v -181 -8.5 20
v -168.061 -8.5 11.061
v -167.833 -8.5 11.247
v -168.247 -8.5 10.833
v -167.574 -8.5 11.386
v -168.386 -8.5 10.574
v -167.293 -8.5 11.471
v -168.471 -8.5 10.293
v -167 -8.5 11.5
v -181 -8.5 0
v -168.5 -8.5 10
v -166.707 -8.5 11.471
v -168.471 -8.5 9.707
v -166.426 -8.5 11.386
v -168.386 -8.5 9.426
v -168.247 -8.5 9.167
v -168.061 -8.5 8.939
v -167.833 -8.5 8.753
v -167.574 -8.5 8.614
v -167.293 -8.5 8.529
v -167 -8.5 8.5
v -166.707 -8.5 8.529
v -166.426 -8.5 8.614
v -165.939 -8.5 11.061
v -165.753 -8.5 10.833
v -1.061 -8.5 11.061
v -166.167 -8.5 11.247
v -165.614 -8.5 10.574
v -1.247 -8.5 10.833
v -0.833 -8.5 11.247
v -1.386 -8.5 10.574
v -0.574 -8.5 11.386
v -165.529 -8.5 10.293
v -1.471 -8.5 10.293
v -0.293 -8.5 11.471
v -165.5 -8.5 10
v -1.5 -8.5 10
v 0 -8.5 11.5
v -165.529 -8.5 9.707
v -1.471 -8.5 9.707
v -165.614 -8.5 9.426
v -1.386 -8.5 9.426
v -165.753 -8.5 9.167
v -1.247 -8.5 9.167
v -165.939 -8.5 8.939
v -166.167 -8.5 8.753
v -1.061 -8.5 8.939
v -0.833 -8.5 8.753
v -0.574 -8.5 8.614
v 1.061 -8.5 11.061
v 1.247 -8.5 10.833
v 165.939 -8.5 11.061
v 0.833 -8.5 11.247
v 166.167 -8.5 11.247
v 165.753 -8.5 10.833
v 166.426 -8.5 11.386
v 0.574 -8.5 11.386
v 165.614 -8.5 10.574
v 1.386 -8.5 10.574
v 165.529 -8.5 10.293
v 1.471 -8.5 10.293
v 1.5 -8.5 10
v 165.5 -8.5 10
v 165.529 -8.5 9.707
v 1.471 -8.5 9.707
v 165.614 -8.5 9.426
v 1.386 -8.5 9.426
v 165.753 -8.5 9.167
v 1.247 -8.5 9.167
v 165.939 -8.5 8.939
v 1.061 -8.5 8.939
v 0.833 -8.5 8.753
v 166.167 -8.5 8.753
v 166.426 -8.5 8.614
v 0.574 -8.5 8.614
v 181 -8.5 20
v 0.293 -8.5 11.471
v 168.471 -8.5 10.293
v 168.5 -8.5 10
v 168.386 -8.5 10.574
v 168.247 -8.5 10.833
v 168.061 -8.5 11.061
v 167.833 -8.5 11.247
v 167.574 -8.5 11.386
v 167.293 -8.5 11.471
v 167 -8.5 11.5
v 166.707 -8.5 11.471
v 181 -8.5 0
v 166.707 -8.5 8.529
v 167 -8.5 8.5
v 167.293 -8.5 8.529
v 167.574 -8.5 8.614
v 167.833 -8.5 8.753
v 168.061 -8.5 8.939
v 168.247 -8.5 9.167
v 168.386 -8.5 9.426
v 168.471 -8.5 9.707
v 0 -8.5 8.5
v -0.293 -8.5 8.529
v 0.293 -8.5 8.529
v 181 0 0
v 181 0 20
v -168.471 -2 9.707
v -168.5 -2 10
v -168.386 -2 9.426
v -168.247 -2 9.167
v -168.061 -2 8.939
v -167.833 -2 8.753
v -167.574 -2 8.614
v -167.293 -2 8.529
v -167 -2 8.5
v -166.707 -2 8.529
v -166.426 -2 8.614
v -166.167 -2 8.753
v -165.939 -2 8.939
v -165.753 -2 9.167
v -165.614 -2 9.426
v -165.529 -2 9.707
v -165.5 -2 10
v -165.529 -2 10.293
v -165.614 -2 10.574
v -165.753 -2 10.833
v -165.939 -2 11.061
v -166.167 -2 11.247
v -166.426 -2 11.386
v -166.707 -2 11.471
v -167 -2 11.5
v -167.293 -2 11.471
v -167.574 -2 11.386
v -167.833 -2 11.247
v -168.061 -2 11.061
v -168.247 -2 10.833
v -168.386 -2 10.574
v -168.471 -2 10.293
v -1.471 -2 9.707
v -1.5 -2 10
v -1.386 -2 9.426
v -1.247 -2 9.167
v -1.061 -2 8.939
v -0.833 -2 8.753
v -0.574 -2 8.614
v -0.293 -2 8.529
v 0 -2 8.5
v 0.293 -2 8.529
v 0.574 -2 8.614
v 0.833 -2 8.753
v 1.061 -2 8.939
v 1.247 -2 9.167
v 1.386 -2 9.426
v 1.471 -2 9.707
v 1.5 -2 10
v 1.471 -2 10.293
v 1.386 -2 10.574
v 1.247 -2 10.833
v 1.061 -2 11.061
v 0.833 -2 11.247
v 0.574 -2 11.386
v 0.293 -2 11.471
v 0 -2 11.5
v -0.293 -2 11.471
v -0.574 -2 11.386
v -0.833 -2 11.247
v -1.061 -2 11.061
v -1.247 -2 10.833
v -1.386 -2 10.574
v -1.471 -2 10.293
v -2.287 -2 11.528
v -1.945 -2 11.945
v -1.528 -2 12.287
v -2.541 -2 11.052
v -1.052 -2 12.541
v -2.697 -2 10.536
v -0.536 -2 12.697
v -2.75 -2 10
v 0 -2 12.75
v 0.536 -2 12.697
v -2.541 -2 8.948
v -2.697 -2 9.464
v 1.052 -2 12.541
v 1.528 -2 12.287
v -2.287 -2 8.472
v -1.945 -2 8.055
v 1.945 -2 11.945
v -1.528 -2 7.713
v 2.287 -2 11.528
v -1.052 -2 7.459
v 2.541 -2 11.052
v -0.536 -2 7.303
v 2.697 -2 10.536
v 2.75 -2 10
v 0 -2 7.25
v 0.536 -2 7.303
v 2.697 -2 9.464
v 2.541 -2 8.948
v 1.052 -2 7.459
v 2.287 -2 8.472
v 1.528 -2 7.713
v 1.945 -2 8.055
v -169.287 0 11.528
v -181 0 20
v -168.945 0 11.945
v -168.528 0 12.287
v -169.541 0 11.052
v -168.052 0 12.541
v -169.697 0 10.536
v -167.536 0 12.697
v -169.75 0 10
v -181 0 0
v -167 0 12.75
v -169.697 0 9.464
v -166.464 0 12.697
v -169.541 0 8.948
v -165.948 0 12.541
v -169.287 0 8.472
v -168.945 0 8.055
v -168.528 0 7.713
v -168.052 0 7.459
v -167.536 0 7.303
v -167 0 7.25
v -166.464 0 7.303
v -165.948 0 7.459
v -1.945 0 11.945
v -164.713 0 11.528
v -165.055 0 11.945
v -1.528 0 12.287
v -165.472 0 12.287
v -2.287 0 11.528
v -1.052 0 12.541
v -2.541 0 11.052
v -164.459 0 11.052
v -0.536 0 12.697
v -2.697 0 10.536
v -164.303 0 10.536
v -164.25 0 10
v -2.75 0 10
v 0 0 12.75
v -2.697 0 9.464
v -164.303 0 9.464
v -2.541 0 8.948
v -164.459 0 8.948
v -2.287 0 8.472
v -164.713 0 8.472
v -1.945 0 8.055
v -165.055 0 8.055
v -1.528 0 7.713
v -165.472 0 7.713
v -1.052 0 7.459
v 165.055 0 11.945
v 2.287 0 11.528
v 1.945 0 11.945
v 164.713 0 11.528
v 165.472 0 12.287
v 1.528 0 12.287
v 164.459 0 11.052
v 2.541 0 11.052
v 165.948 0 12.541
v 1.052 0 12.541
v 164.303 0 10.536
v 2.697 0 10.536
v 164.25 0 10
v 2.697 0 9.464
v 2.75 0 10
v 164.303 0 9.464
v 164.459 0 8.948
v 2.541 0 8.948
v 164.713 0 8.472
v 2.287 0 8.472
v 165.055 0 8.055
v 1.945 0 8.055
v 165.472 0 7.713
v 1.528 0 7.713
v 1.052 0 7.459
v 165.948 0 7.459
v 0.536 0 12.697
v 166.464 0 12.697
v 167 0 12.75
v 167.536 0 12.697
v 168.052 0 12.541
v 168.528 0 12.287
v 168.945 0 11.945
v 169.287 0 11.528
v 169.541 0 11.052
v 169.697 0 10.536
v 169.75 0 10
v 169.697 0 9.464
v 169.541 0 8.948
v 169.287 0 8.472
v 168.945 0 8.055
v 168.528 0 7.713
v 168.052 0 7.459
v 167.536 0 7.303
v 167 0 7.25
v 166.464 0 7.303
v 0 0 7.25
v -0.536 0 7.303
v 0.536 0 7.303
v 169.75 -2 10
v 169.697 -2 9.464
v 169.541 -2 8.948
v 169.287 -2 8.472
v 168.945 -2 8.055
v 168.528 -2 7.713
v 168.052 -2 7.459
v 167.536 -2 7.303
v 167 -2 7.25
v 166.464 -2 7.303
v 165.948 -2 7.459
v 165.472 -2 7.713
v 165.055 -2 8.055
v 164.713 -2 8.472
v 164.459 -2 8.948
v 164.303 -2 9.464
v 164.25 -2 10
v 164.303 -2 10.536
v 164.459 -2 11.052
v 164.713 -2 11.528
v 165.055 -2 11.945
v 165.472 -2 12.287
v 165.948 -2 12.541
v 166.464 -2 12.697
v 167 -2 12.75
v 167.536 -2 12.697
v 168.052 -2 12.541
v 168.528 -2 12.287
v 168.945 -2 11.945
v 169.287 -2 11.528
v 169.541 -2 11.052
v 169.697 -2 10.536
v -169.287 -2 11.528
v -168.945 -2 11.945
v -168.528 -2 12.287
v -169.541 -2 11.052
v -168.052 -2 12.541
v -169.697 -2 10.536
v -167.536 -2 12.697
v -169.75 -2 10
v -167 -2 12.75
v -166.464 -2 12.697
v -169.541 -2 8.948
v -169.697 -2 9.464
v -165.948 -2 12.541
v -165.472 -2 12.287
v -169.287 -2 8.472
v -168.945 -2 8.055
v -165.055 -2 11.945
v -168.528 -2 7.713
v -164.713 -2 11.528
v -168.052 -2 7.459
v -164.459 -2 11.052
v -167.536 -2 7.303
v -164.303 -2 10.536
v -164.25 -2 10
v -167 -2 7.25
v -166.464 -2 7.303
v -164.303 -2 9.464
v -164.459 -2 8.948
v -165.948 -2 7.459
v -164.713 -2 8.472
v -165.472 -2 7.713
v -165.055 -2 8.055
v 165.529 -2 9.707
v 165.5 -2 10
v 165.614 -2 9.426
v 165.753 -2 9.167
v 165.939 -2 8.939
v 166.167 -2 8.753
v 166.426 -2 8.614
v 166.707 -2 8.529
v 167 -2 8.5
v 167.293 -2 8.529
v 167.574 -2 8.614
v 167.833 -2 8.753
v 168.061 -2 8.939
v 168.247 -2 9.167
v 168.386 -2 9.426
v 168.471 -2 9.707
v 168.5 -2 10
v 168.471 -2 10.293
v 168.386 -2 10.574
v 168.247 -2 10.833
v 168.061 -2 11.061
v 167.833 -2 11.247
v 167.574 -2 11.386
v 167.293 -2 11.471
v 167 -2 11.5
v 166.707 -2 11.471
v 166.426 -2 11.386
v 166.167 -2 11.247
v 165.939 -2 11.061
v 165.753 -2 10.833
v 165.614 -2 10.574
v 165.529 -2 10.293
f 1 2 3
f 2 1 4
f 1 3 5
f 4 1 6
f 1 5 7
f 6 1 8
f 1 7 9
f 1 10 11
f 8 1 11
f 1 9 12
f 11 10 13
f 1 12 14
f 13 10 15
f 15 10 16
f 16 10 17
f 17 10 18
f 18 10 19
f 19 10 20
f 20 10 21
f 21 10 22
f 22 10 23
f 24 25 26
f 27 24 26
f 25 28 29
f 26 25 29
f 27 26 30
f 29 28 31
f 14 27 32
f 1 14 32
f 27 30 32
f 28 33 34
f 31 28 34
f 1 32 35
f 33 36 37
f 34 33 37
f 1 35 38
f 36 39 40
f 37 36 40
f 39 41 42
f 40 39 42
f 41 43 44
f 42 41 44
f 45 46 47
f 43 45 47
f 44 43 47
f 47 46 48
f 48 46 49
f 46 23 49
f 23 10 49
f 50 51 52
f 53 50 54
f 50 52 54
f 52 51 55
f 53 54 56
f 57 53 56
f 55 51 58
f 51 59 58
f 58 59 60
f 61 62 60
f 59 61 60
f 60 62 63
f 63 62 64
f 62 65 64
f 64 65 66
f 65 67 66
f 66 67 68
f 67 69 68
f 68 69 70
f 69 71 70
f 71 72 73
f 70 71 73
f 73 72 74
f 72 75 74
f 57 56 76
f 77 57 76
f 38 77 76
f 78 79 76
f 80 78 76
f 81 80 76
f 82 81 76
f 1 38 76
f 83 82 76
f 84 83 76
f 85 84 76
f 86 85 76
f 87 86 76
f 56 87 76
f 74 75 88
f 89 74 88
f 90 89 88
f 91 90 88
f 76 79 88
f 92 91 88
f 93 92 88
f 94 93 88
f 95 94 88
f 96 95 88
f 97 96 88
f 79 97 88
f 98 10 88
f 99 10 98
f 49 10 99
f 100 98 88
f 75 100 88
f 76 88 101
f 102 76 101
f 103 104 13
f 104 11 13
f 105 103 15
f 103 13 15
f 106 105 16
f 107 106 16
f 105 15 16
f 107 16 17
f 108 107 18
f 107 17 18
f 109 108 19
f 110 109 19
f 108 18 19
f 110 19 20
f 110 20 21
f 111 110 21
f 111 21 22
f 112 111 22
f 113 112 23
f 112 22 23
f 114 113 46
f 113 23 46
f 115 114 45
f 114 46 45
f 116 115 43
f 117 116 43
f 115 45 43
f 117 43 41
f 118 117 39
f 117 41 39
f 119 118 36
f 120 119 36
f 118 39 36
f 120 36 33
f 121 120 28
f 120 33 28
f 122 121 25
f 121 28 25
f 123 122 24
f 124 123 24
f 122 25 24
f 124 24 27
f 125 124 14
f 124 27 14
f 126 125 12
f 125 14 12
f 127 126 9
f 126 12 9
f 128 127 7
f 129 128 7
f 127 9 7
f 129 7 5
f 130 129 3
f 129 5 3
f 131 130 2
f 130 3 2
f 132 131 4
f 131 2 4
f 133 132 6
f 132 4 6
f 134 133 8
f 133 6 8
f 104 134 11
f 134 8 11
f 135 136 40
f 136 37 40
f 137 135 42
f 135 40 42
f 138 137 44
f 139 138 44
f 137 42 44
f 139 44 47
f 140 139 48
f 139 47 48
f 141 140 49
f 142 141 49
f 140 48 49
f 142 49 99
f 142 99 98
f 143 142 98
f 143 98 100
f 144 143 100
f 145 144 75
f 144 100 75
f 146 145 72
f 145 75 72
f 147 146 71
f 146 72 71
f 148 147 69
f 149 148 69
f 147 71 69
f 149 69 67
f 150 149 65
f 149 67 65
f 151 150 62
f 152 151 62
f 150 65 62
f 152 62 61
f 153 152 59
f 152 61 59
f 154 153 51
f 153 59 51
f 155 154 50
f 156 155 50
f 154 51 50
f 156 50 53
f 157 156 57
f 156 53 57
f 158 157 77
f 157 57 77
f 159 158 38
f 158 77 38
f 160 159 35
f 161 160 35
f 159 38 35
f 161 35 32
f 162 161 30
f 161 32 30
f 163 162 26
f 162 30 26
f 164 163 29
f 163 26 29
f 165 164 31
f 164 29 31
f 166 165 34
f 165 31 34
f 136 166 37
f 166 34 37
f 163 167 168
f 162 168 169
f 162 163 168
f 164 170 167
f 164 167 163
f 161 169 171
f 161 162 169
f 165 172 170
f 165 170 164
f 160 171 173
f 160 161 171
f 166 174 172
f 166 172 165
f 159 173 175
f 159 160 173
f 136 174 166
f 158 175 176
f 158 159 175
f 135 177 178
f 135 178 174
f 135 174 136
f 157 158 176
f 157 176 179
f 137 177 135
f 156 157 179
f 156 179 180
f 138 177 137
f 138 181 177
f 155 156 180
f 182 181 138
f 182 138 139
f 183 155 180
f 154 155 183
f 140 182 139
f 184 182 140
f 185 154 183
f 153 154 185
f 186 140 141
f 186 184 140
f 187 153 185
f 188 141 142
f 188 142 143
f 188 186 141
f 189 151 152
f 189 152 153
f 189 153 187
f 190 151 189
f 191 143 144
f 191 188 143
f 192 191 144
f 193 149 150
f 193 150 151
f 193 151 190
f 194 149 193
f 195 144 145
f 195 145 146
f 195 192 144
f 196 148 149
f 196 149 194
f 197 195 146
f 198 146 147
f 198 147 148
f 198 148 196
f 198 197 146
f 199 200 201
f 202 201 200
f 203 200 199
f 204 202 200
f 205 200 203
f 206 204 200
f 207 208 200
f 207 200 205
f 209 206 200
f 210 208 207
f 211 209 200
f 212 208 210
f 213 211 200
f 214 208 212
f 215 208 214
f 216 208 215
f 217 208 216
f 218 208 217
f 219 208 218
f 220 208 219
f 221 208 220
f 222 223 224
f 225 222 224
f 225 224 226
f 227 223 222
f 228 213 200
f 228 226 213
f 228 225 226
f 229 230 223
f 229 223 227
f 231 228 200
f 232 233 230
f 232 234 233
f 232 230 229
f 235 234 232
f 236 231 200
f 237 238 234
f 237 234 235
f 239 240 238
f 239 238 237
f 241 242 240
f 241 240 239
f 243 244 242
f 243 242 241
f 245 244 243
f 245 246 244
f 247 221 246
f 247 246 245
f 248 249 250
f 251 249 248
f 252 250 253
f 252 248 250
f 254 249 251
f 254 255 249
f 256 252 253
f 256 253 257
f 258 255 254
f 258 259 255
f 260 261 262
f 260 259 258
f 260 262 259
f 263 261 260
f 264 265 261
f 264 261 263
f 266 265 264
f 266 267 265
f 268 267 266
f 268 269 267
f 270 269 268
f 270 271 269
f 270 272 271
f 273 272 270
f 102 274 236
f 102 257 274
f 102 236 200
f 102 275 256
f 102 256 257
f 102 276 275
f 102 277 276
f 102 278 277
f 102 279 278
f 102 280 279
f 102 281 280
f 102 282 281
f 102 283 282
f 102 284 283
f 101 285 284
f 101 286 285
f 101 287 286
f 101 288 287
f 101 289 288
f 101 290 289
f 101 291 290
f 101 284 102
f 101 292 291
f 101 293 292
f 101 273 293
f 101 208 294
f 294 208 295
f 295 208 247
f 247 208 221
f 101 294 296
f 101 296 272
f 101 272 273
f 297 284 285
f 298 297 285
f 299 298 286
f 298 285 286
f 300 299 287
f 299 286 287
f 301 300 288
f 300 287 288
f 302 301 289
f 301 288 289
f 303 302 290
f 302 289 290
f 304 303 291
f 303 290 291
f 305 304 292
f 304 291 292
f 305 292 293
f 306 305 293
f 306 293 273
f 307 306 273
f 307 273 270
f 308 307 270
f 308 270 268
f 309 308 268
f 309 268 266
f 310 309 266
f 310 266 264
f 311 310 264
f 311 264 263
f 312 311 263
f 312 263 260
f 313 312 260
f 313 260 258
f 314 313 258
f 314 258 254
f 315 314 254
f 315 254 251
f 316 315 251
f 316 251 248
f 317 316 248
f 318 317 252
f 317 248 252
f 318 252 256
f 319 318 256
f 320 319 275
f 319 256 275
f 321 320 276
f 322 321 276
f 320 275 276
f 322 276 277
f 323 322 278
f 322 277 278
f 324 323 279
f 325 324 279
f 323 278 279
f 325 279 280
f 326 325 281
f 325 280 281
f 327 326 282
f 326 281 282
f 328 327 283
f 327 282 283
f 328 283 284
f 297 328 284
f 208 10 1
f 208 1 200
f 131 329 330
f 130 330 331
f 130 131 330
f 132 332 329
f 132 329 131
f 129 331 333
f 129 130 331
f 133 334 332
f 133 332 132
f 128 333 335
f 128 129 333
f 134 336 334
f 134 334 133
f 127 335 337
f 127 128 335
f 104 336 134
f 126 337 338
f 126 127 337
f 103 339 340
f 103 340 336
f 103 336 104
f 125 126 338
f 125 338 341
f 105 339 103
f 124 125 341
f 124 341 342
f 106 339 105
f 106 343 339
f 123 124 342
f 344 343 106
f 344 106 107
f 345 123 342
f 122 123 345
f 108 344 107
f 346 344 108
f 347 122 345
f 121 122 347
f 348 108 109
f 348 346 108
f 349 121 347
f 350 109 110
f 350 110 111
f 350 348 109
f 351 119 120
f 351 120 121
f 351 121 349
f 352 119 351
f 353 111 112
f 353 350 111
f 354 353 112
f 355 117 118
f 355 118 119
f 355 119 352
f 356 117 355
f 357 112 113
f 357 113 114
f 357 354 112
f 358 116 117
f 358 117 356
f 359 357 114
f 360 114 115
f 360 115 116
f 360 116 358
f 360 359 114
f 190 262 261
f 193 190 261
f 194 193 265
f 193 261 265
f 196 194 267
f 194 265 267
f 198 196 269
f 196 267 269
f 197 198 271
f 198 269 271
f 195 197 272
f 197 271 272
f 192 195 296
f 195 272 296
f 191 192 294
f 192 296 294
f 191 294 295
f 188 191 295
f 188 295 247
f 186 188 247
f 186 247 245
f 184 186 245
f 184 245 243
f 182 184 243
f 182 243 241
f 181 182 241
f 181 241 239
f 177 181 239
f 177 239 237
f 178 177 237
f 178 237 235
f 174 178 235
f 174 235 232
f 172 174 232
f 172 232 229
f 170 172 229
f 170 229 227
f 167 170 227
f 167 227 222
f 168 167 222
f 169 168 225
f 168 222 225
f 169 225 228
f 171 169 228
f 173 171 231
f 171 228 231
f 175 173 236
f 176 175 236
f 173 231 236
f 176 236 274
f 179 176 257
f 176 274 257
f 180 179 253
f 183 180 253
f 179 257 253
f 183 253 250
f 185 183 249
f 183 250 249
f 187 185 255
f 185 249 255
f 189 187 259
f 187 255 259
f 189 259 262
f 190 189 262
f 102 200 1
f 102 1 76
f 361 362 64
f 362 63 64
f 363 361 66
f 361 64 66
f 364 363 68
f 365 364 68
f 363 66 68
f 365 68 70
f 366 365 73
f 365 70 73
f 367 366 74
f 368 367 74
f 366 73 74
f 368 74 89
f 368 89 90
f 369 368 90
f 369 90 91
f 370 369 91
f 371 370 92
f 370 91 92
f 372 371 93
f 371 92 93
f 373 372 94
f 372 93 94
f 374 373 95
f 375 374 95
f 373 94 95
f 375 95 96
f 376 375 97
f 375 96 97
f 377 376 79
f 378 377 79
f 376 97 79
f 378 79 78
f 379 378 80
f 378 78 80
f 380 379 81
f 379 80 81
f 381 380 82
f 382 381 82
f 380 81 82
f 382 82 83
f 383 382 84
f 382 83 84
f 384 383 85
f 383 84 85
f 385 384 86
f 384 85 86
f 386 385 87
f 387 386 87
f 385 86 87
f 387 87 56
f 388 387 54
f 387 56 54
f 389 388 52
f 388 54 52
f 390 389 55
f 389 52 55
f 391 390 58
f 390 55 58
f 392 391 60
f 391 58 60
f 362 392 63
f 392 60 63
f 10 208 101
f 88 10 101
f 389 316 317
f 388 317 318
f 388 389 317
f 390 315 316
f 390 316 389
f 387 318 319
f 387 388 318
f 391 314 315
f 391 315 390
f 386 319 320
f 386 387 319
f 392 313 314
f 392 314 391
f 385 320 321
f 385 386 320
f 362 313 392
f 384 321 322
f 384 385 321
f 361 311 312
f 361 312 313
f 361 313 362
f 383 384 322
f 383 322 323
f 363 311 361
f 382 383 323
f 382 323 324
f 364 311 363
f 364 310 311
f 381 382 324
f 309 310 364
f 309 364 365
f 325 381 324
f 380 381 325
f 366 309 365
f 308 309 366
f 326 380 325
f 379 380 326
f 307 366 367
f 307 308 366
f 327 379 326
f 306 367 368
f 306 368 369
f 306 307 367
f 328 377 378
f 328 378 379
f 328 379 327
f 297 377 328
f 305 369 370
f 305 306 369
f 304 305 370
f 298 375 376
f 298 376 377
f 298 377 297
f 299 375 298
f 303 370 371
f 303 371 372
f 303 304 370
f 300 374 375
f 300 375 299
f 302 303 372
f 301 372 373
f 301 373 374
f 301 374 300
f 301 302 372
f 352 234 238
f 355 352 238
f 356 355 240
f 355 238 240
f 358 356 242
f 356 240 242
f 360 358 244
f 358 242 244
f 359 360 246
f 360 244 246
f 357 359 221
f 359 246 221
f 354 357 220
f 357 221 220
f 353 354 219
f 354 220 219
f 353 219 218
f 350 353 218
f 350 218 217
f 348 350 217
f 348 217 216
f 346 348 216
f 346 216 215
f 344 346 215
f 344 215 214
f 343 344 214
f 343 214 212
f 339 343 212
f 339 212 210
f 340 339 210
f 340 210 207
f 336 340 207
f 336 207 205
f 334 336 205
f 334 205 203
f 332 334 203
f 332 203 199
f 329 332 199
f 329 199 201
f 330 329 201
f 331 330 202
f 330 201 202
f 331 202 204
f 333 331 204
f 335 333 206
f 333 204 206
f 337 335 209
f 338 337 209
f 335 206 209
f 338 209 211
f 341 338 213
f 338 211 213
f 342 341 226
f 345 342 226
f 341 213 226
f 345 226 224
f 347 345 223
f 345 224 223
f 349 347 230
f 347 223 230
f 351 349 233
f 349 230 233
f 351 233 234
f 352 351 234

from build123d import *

# Parameters (mm, degrees)
ESQUISSE1_W                                        = 362
ESQUISSE1_H                                        = 8.5
BOSS_EXTRU_1_DEPTH                                 = 20
CHAMBRAGE_POUR_VIS_T_TE_CYLINDRIQUE_CO_D           = 3
CHAMBRAGE_POUR_VIS_T_TE_CYLINDRIQUE_CO_CBORE_D     = 5.5
CHAMBRAGE_POUR_VIS_T_TE_CYLINDRIQUE_CO_CBORE_DEPTH = 2


with BuildPart() as part:
    # Esquisse1 → Boss.-Extru.1 (new body)
    with BuildSketch(Plane.XY):
        with Locations((0, -4.25)):
            Rectangle(ESQUISSE1_W, ESQUISSE1_H)
    extrude(amount=BOSS_EXTRU_1_DEPTH)

    # Chambrage pour vis à tête cylindrique courte six pans creux M31 (through all)
    with Locations(Plane(origin=(0, 0, 0), x_dir=(1, 0, 0), z_dir=(0, 1, 0))):
        with Locations((-167, -10), (167, -10), (0, -10)):
            CounterBoreHole(CHAMBRAGE_POUR_VIS_T_TE_CYLINDRIQUE_CO_D / 2, CHAMBRAGE_POUR_VIS_T_TE_CYLINDRIQUE_CO_CBORE_D / 2, CHAMBRAGE_POUR_VIS_T_TE_CYLINDRIQUE_CO_CBORE_DEPTH)


solid = part.part
